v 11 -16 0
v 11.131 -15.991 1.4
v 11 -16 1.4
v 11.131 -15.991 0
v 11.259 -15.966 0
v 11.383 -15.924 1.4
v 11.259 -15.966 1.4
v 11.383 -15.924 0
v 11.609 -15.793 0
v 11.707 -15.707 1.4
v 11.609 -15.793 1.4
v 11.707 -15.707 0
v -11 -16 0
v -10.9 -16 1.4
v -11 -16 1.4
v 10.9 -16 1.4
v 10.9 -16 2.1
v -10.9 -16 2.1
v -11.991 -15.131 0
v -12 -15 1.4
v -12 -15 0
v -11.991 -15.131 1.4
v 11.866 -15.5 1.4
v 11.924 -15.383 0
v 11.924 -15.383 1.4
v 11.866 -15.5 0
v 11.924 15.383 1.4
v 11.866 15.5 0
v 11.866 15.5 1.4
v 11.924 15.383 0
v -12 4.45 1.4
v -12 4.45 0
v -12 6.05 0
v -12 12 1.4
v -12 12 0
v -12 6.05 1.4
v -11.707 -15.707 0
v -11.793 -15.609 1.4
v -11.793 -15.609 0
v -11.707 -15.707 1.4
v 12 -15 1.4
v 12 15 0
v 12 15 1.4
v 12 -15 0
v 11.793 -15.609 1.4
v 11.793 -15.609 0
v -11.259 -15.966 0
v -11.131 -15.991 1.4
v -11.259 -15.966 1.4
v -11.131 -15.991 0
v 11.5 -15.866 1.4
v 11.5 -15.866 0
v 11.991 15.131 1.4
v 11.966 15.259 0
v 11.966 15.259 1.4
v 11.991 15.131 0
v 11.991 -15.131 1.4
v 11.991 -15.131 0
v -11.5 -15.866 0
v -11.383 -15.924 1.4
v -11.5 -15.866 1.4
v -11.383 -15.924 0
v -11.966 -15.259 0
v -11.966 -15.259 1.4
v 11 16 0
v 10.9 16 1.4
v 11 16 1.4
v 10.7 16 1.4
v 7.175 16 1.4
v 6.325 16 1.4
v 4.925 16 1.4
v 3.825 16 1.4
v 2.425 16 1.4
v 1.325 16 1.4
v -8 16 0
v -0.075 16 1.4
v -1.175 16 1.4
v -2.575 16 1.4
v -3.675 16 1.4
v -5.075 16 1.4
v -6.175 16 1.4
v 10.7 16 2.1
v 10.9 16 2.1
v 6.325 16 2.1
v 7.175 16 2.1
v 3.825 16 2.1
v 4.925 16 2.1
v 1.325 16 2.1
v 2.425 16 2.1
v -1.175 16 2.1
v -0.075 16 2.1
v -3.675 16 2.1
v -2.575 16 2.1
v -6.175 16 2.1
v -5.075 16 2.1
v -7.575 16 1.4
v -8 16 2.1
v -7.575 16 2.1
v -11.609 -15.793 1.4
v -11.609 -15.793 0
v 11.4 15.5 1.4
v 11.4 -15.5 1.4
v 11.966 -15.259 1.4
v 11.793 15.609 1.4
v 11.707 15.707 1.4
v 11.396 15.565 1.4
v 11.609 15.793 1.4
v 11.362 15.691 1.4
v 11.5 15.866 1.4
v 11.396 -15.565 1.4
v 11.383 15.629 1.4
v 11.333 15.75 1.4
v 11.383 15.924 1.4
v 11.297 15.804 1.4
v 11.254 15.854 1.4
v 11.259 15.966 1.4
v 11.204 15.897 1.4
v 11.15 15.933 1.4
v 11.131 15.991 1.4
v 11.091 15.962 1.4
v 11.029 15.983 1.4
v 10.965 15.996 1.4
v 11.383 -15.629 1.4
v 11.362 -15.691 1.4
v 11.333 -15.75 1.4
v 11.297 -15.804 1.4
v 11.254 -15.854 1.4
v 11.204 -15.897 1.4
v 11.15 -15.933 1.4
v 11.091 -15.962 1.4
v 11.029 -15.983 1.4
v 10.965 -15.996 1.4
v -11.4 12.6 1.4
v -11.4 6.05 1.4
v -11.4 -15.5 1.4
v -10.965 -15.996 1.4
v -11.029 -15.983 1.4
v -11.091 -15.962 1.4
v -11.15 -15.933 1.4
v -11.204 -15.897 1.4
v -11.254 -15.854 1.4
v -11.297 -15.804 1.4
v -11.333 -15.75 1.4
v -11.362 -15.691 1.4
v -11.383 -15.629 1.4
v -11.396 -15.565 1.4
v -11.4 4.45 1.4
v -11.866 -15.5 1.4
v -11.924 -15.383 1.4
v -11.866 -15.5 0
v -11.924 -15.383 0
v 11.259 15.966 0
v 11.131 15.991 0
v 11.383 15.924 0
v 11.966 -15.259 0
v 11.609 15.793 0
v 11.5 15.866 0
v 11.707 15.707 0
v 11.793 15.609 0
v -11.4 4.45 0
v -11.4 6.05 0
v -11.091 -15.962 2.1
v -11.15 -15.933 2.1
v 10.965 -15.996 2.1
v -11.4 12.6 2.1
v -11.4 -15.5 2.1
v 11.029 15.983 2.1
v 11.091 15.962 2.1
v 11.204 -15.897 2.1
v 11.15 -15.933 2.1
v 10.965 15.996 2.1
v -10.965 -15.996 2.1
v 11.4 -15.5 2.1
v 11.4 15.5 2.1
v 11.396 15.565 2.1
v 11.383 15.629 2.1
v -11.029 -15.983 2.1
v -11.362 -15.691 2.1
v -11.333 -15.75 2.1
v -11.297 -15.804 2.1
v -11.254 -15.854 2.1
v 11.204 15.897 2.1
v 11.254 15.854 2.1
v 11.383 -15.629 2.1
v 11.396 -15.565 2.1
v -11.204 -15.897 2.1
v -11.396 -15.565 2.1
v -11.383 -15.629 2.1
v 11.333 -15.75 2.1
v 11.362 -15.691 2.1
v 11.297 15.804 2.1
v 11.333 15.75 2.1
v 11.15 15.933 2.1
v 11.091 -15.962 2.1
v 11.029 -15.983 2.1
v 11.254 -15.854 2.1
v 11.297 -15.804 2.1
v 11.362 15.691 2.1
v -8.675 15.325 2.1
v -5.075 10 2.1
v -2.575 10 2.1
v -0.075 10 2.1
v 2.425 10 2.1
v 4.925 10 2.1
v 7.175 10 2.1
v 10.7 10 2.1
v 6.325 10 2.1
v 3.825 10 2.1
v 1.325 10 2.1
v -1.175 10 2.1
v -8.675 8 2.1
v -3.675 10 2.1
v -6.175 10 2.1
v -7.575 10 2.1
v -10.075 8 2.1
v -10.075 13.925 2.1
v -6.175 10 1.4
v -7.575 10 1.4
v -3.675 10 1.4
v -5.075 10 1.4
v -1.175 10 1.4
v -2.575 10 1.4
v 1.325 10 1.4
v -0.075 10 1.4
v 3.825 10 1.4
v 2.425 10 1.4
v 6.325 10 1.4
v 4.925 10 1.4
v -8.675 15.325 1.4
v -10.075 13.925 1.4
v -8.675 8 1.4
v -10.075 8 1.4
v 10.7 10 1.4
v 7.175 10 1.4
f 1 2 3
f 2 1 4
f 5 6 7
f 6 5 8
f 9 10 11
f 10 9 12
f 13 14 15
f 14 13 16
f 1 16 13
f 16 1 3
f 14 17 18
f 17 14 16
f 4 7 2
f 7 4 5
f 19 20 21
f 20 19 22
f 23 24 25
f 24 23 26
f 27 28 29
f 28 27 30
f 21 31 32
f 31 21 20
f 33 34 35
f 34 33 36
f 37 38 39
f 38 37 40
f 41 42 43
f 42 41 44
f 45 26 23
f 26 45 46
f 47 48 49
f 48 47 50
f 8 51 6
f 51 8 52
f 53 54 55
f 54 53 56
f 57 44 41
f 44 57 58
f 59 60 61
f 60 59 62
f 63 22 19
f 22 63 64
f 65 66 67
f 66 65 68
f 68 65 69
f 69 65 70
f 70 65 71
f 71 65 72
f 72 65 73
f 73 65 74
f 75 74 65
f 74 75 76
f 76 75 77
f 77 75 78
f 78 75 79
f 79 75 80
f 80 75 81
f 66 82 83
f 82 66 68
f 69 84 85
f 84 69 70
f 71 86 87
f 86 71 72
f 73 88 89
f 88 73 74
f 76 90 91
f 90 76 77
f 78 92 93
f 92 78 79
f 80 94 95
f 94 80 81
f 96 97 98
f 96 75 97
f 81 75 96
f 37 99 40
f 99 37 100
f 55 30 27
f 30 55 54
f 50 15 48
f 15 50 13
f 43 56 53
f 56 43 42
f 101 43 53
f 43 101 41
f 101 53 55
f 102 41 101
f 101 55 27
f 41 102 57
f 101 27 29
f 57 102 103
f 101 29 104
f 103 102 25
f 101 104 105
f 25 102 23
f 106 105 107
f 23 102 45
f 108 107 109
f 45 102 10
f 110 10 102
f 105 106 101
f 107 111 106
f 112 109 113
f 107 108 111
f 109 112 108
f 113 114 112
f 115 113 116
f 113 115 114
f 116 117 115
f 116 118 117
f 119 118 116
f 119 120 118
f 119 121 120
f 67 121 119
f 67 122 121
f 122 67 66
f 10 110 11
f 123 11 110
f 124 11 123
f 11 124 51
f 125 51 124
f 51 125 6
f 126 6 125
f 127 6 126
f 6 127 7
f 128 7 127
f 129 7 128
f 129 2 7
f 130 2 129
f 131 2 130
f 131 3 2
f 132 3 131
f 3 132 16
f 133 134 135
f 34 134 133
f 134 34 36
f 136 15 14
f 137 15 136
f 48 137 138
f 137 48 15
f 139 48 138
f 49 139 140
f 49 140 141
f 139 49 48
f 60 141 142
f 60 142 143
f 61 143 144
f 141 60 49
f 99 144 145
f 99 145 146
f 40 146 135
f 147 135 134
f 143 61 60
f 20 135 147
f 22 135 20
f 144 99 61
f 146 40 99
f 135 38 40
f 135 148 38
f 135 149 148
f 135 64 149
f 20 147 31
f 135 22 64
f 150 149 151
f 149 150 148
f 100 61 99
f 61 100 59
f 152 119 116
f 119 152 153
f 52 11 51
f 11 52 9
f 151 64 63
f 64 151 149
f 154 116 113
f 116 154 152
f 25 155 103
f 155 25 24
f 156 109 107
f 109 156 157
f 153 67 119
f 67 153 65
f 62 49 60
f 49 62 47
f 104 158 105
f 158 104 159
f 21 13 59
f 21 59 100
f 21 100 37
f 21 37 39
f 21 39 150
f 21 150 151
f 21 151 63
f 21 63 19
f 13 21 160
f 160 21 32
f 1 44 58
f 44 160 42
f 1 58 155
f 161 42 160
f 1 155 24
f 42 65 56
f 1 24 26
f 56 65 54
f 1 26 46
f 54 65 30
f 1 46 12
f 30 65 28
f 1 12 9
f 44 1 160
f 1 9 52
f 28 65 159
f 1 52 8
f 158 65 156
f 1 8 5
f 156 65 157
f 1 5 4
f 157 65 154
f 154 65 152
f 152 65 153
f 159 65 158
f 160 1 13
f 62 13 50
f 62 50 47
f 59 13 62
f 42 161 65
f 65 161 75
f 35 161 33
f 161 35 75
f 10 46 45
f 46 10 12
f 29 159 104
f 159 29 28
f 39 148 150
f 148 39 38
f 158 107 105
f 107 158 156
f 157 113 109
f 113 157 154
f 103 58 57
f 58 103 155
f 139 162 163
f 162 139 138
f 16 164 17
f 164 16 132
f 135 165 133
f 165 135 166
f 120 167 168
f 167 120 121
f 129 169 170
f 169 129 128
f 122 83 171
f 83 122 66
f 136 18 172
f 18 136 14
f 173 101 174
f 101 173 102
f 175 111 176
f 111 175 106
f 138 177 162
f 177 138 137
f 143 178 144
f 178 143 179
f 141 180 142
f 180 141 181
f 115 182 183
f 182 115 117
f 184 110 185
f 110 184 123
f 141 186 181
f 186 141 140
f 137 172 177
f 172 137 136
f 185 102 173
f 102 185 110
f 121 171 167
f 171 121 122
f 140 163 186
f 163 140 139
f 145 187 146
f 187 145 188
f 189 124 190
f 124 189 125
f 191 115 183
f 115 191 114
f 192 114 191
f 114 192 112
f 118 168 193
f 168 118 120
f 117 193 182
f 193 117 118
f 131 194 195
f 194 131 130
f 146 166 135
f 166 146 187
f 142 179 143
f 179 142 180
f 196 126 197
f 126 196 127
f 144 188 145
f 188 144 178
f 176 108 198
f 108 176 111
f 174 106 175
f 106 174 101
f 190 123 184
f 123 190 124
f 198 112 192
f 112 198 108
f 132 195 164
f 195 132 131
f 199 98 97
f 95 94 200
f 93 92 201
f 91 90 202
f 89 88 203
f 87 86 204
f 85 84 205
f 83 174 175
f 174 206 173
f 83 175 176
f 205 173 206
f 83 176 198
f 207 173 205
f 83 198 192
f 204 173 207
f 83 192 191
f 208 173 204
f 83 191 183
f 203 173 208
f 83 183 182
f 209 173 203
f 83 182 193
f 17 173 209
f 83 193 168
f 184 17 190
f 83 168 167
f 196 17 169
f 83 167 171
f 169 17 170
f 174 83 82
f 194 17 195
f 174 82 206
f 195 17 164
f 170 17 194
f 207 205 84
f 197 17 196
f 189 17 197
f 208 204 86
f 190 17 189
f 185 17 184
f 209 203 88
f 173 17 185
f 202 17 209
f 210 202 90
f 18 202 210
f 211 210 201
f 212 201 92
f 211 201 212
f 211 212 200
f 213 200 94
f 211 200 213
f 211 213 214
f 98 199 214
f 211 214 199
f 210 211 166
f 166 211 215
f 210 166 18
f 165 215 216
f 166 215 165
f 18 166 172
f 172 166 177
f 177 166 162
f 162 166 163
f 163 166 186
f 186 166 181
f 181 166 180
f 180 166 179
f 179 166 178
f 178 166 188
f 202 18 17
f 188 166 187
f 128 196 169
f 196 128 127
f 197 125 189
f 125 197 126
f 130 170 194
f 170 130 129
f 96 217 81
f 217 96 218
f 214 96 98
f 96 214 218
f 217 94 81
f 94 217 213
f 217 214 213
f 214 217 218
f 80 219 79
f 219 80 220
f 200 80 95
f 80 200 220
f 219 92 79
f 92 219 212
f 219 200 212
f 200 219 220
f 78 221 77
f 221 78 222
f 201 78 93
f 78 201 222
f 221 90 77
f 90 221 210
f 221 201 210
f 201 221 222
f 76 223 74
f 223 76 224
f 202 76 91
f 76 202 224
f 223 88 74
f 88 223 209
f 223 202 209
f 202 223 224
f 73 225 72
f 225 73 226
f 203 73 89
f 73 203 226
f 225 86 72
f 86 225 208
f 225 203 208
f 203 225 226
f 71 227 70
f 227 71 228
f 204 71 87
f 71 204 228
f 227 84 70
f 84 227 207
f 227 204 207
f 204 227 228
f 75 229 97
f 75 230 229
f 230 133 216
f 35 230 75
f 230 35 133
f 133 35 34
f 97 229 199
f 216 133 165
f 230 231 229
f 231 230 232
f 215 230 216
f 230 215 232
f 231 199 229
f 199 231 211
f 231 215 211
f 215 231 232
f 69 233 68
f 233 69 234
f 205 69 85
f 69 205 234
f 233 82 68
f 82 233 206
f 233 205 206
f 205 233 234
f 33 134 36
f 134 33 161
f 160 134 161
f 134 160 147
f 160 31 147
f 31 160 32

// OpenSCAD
sdCardOvDims=[24,32,2.1];
sdCardBrmWdth=0.6;
sdCardCrnrRad=1;
sdCardNotchDims=[sdCardBrmWdth,1.5];
sdCardNotchYOffset=sdCardOvDims.y/2-11.5+sdCardNotchDims.y/2;
cntctSurHght=1.4;
cntcCavDist=2.5;
cntcCavDims=[1.4,6,sdCardOvDims.z-cntctSurHght];
cntcCav1XOffset=-8.125+cntcCavDist/2;
cntcCav9Dims=[1.4,8,sdCardOvDims.z-cntctSurHght];
cntcCav9XOffset=-8.125-cntcCavDist/2;
cntcCav78Dims=[sdCardOvDims.x/2-0.7-sdCardBrmWdth-(-8.125+6*cntcCavDist+0.3),6,sdCardOvDims.z-cntctSurHght];
cntcCav78XOffset=sdCardOvDims.x/2-0.7-sdCardBrmWdth-cntcCav78Dims.x/2;


fudge=0.1;
$fn=48;

//bottom
difference(){
  union(){
    linear_extrude(1.4) offset(sdCardCrnrRad) square([sdCardOvDims.x-sdCardCrnrRad*2,sdCardOvDims.y-sdCardCrnrRad*2],true);
    linear_extrude(sdCardOvDims.z) offset(sdCardCrnrRad/2) 
      square([sdCardOvDims.x-sdCardCrnrRad-sdCardBrmWdth*2,sdCardOvDims.y-sdCardCrnrRad],true);
  }
  translate([-sdCardOvDims.x/2,sdCardOvDims.y/2,-fudge/2]) linear_extrude(sdCardOvDims.z+fudge) circle(d=8,$fn=4);
  //contact cavities 1-6
  for (i=[0:5])
    translate([i*cntcCavDist+cntcCav1XOffset,(sdCardOvDims.y-cntcCavDims.y+fudge)/2,cntctSurHght]) 
      linear_extrude(cntcCavDims.z+fudge) square([cntcCavDims.x,cntcCavDims.y+fudge],true);
  //contact cavitiy 9
  translate([cntcCav9XOffset,(sdCardOvDims.y-cntcCav9Dims.y+fudge)/2,cntctSurHght]) 
    linear_extrude(cntcCavDims.z+fudge)square([cntcCav9Dims.x,cntcCav9Dims.y+fudge],true);
  //contact cavity pins 7&8
  translate([cntcCav78XOffset,(sdCardOvDims.y-cntcCav78Dims.y+fudge)/2,cntctSurHght]) 
    linear_extrude(cntcCavDims.z+fudge)square([cntcCav78Dims.x,cntcCav78Dims.y+fudge],true);
  //notch
  translate([-(sdCardOvDims.x-sdCardNotchDims.x+fudge)/2,sdCardNotchYOffset,-fudge/2]) 
    linear_extrude(sdCardOvDims.z+fudge) square([sdCardNotchDims.x+fudge,sdCardNotchDims.y+fudge],true);
}
  
